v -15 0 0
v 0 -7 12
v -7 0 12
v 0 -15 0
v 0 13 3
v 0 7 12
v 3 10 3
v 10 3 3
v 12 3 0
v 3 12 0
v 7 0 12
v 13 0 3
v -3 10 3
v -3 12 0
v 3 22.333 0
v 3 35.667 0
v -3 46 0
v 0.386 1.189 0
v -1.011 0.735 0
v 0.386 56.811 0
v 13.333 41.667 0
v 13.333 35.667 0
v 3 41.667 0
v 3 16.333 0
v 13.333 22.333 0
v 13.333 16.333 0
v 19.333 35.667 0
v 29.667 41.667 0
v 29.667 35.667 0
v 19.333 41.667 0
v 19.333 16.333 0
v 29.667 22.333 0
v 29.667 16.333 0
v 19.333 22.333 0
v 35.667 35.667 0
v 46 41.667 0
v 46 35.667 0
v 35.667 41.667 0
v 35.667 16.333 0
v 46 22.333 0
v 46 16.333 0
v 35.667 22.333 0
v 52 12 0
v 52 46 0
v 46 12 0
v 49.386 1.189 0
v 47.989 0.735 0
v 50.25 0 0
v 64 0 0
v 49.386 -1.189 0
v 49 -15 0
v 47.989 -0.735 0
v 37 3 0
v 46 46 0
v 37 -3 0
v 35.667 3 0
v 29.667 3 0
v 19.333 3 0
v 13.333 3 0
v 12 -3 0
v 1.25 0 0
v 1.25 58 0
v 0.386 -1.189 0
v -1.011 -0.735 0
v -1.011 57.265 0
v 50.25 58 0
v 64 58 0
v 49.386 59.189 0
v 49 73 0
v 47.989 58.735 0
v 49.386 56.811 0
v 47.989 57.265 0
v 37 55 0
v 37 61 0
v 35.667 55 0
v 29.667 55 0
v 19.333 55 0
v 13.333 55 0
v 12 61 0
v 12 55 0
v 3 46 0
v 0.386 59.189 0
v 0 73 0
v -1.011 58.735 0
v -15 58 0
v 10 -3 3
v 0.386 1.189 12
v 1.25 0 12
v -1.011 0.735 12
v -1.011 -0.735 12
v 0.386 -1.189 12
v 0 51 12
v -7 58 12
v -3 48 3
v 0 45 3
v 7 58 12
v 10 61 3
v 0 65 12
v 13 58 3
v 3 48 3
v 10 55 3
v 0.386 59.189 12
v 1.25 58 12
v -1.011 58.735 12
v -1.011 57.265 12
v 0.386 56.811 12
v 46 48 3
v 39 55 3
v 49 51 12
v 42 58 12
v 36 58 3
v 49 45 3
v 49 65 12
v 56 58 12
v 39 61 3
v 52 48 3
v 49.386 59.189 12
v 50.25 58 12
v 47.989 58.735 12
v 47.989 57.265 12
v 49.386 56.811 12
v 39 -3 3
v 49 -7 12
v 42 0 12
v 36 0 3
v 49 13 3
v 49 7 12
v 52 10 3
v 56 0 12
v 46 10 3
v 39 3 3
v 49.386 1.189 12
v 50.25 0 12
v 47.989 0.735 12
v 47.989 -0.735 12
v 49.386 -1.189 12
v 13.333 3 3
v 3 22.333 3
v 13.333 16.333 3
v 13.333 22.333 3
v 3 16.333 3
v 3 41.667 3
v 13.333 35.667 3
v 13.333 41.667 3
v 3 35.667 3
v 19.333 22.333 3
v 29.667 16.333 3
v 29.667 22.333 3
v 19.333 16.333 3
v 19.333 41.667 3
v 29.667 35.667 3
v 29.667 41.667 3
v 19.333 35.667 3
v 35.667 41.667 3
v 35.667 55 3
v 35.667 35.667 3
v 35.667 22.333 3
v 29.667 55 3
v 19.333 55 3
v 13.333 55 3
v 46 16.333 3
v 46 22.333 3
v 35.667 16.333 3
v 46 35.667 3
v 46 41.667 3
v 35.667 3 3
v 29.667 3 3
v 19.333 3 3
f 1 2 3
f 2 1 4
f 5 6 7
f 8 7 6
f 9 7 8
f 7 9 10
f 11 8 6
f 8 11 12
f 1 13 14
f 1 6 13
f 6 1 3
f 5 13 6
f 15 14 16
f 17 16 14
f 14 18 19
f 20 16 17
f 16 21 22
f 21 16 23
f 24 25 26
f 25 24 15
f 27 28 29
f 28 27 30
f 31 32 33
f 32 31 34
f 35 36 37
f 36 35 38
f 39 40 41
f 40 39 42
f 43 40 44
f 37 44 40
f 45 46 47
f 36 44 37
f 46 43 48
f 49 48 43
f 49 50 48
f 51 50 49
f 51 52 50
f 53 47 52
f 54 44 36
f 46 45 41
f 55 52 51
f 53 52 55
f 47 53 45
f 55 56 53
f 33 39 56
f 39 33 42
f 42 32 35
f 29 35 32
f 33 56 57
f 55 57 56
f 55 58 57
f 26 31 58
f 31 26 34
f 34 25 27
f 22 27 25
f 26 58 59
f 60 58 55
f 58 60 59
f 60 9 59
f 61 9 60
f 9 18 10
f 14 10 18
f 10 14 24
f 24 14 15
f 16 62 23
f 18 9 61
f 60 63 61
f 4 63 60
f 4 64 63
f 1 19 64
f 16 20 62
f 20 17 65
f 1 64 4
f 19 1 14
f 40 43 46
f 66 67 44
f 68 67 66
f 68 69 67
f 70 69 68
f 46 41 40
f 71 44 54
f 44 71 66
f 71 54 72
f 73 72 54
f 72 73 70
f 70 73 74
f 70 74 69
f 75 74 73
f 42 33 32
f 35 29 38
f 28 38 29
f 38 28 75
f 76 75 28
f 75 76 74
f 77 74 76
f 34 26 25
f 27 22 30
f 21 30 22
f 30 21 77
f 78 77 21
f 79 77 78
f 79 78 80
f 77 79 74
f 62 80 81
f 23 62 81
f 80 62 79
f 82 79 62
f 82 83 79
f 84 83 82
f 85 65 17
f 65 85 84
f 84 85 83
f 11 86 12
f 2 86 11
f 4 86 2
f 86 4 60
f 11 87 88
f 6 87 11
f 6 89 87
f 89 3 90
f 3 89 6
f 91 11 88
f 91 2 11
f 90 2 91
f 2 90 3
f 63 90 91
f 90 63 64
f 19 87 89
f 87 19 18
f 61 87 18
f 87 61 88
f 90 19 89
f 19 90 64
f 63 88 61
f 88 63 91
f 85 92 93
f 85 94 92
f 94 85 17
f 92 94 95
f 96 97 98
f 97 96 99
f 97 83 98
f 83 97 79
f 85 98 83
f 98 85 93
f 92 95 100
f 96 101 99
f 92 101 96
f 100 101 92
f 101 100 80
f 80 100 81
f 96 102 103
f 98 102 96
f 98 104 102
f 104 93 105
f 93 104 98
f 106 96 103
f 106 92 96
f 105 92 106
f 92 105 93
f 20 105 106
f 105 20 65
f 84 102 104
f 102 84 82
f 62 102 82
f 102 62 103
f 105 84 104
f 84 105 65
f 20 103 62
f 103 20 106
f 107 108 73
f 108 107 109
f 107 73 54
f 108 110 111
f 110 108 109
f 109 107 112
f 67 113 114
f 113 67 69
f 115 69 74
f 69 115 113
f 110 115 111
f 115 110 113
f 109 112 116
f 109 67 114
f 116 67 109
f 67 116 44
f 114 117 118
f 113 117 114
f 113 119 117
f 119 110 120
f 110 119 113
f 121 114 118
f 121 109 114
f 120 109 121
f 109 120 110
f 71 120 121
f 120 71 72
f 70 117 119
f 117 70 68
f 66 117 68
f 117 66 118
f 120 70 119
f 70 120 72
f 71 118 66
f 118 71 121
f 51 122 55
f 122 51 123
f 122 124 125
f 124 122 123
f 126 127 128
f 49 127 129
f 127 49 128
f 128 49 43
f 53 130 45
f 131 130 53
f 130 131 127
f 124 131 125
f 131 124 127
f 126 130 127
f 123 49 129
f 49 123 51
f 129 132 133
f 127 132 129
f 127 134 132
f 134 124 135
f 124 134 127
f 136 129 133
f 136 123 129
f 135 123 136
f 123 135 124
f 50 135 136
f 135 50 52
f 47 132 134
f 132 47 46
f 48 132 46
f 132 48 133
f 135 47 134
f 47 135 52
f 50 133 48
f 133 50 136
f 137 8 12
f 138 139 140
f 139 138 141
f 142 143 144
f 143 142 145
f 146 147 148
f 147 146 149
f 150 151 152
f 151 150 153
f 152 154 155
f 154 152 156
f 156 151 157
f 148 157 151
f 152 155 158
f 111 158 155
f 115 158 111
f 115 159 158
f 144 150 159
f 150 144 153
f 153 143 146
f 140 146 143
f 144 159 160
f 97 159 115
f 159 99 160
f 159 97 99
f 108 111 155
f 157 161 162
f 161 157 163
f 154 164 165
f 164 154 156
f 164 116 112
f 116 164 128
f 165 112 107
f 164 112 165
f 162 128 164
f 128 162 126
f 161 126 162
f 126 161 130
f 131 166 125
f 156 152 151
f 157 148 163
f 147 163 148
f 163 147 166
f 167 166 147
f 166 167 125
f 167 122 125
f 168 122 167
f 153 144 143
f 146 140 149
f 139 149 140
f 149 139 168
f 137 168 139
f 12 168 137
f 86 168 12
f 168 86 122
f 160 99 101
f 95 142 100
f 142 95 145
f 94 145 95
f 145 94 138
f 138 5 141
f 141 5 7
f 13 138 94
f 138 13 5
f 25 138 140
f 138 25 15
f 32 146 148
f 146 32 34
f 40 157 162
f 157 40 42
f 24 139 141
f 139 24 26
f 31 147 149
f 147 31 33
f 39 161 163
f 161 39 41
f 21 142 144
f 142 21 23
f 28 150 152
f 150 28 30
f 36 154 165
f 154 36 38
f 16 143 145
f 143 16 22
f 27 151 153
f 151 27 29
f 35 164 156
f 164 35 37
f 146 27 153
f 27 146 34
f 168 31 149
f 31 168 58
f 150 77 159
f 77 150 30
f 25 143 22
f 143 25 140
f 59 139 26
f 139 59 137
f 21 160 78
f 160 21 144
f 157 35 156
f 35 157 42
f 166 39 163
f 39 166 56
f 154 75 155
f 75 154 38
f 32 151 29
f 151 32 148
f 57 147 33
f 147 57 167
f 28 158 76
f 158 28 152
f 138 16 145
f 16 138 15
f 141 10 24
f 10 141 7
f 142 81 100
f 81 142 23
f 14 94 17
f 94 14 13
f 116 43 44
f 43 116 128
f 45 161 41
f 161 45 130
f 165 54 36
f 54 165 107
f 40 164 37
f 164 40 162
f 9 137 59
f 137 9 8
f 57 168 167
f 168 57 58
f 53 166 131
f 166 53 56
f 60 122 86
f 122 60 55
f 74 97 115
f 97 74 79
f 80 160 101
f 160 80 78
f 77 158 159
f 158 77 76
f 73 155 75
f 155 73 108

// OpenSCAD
/////////////////////////////////// Consts
dim = [49, 58]; // x, y
screw_hole_r = 1.25; // M2.5
screw_insert_dim = [12,15,7]; //(h, r1, r2)
support_thickness = [6, 3]; // x, z
support_offset = 5;
additional_supports = 2;
////////////////////////////////// Create
//inserts
ScrewInsert([0,0,0]);
ScrewInsert([0,dim[1],0]);
ScrewInsert([dim[0],dim[1],0]);
ScrewInsert([dim[0],0,0]);

//support_right_angle
translate([-support_thickness[0]/2,support_offset,0])
    cube([support_thickness[0],dim[1]-(support_offset*2),support_thickness[1]]);

translate([-support_thickness[0]/2+dim[0],support_offset,0])
    cube([support_thickness[0],dim[1]-(support_offset*2),support_thickness[1]]);

translate([support_offset,-support_thickness[0]/2,0])
    cube([dim[0]-(support_offset*2),support_thickness[0],support_thickness[1]]);

translate([support_offset,-support_thickness[0]/2+dim[1],0])
    cube([dim[0]-(support_offset*2),support_thickness[0],support_thickness[1]]);

for (i = [1:1:additional_supports])
    translate([0,-support_thickness[0]/2+(dim[1] * (i/(additional_supports+1))),0])
        cube([dim[0],support_thickness[0],support_thickness[1]]);

for (i = [1:1:additional_supports])
    translate([-support_thickness[0]/2 + (dim[0] * (i/(additional_supports+1))),0,0])
        cube([support_thickness[0],dim[1],support_thickness[1]]);
    
////////////////////////////////// Building Blocks
module ScrewInsert(pos){
    translate(pos){
        difference(){
        //cylinder(h, r1, r2)
            cylinder(screw_insert_dim[0],screw_insert_dim[1],screw_insert_dim[2],$fn=4);
            cylinder(999,screw_hole_r,screw_hole_r);
        }
    }
}
